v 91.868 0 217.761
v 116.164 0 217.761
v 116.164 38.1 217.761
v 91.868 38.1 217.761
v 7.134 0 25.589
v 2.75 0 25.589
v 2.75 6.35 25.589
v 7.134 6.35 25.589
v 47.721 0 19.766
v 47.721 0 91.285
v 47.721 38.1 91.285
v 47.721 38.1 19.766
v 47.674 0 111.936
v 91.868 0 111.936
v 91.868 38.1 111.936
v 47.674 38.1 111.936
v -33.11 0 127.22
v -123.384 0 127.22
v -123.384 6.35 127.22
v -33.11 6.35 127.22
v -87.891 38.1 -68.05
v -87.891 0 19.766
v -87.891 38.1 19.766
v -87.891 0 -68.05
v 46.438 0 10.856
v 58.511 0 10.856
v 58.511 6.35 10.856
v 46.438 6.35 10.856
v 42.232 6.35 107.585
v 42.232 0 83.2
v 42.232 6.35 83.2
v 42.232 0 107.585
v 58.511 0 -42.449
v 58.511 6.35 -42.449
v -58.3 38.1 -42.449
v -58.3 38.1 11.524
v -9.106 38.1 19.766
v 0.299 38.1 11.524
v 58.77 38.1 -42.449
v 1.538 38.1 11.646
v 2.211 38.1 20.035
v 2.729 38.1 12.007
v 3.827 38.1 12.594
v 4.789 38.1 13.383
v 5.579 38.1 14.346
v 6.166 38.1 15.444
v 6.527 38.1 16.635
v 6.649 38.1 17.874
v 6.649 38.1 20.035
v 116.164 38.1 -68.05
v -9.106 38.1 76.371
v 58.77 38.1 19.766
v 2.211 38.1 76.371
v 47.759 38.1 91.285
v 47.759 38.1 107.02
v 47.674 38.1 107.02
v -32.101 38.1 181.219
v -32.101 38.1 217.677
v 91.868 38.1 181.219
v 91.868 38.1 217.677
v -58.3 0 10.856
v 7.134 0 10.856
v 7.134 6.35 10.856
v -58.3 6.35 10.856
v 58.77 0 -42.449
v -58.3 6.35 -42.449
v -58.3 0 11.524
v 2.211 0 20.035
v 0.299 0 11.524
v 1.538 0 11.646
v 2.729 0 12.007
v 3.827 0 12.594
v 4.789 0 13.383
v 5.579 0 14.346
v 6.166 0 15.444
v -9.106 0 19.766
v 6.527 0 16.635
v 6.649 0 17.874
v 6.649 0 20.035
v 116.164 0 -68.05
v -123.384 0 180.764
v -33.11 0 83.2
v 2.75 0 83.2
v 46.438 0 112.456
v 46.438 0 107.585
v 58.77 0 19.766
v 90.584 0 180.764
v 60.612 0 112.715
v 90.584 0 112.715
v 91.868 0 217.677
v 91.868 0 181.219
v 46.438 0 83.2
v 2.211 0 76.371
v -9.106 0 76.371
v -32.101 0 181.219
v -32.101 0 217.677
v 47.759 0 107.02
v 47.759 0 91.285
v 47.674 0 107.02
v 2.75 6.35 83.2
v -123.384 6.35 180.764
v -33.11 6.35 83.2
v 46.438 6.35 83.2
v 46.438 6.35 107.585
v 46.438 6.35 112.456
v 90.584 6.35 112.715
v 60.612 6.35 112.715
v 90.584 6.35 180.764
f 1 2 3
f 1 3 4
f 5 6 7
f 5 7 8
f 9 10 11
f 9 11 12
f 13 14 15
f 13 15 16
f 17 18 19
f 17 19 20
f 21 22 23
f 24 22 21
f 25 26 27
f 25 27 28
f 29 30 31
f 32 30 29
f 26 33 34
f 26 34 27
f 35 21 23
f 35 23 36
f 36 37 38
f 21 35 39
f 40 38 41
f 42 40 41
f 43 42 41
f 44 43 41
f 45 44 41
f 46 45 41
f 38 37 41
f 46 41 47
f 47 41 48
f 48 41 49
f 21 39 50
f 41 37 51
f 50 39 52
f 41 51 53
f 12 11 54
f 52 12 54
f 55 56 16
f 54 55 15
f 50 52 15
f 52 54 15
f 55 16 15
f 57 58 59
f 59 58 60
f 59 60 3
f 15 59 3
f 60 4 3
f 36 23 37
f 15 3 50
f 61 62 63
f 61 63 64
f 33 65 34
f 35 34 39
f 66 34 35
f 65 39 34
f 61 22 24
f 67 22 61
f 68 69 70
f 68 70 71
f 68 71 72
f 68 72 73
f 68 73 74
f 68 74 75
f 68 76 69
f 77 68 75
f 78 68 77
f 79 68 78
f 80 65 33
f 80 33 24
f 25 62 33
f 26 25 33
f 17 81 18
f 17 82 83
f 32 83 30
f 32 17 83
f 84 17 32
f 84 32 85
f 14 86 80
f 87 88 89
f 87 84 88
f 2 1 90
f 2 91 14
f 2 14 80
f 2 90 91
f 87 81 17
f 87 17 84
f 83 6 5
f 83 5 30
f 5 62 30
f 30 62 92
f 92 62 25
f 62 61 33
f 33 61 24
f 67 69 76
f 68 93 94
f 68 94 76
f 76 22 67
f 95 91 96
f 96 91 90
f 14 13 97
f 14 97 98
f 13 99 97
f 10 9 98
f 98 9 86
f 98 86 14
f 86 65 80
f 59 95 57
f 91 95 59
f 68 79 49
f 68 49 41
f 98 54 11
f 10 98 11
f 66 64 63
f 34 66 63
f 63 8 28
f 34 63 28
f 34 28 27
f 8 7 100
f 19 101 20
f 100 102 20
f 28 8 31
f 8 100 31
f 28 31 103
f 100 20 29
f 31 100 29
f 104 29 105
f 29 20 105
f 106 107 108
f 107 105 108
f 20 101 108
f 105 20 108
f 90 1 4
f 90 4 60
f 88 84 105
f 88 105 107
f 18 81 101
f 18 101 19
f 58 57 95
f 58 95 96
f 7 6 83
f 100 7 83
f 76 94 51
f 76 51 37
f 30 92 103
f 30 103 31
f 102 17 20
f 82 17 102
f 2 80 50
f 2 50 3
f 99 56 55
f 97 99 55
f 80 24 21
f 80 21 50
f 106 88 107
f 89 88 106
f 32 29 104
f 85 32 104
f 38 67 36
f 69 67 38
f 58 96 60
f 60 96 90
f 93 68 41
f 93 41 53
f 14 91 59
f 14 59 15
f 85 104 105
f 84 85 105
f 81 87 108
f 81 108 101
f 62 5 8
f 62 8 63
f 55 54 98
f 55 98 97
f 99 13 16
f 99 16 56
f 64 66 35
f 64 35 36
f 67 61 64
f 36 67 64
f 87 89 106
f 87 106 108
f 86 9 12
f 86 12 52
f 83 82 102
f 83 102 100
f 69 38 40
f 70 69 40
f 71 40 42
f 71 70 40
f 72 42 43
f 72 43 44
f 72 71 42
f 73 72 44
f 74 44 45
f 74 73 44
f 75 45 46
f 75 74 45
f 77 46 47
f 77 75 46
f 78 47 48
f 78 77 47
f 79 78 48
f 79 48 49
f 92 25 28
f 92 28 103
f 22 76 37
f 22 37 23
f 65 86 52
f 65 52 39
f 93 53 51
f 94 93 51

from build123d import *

# Parameters (mm, degrees)
F1_W     = 123.9689588547
F1_H     = 36.4573895931
F1_W_2   = 0.162653625
F1_W_3   = 29.5906402171
F1_H_2   = 8.2422317937
F1_W_4   = 49.1941384971
F1_W_5   = 22.0608375967
F1_H_3   = 15.7345682383
F2_DEPTH = 38.1
F0_W     = 4.2057580379
F0_H     = 0.258524442
F0_H_2   = 4.8711853978
F0_W_2   = 4.3841055594
F0_H_3   = 57.6105192304
F3_DEPTH = 6.35


with BuildPart() as f2:
    # F1 (on Front) → F2 (new body)
    with BuildSketch(Plane.XZ):
        with Locations((29.8835039139, 199.447914958)):
            Rectangle(F1_W, F1_H)
        Polygon((-9.1060101986, 25.0596683472), (-9.1060101986, 20.0354661793), (2.2110529244, 20.0354661793), (2.2110529244, 76.3713121414), (-9.1060101986, 76.3713121414), align=None)
        Polygon((92.0306369662, 181.2192201614), (91.8679833412, 181.2192201614), (91.8679833412, 111.9364649057), (116.1640360951, 111.9364649057), (116.1640360951, 217.7610099316), (91.8679833412, 217.7610099316), (91.8679833412, 217.6766097546), (92.0306369662, 217.6766097546), align=None)
        with Locations((91.9493101537, 199.447914958)):
            Rectangle(F1_W_2, F1_H)
        Polygon((-87.8907889128, -68.0502578616), (-58.3001486957, -68.0502578616), (-58.3001486957, -42.4493700266), (-58.3001486957, 11.523572728), (-87.8907889128, 11.523572728), align=None)
        with Locations((-73.0954688042, 15.6446886249)):
            Rectangle(F1_W_3, F1_H_2)
        with BuildLine():
            Line((-9.1060101986, 19.7658045217), (-9.1060101986, 11.523572728))
            Line((-9.1060101986, 11.523572728), (0.2991169855, 11.523572728))
            ThreePointArc((0.2991169855, 11.523572728), (4.789245046, 13.3834446675), (6.6491169855, 17.873572728))
            Line((6.6491169855, 17.873572728), (6.6491169855, 20.0354661793))
            Line((6.6491169855, 20.0354661793), (2.2110529244, 20.0354661793))
            Line((2.2110529244, 20.0354661793), (-9.1060101986, 20.0354661793))
            Line((-9.1060101986, 20.0354661793), (-9.1060101986, 19.7658045217))
        make_face()
        with Locations((-33.7030794472, 15.6446886249)):
            Rectangle(F1_W_4, F1_H_2)
        with Locations((58.7894786149, 99.1525352001)):
            Rectangle(F1_W_5, F1_H_3)
        Polygon((69.8198974133, 91.285251081), (47.7590598166, 91.285251081), (47.7206557989, 91.285251081), (47.7206557989, 19.7658045217), (58.7702766061, 19.7658045217), (69.8198974133, 19.7658045217), align=None)
        Polygon((69.8198974133, -42.4493700266), (69.8198974133, 19.7658045217), (58.7702766061, 19.7658045217), (58.7702766061, 19.5491779596), (58.7702766061, -42.4493700266), align=None)
        Polygon((-58.3001486957, -68.0502578616), (69.8198974133, -68.0502578616), (69.8198974133, -42.4493700266), (58.7702766061, -42.4493700266), (-58.3001486957, -42.4493700266), align=None)
        Polygon((116.1640360951, 111.9364649057), (91.8679833412, 111.9364649057), (47.6743020117, 111.9364649057), (47.6743020117, 107.0198193192), (47.7590598166, 107.0198193192), (69.8198974133, 107.0198193192), (116.1640360951, 107.0198193192), align=None)
        Polygon((116.1640360951, -68.0502578616), (116.1640360951, 107.0198193192), (69.8198974133, 107.0198193192), (69.8198974133, 91.285251081), (69.8198974133, 19.7658045217), (69.8198974133, -42.4493700266), (69.8198974133, -68.0502578616), align=None)
    extrude(amount=-F2_DEPTH)

    # F0 (on Front) → F3 (join)
    with BuildSketch(Plane.XZ):
        Polygon((60.6123084808, 112.7149015665), (90.5843084808, 112.7149015665), (90.5843084808, 180.7640045881), (-33.110268414, 180.7640045881), (-33.110268414, 127.2203028202), (-33.110268414, 112.7149015665), (2.749980893, 112.7149015665), (42.2322228551, 112.7149015665), (46.437980893, 112.7149015665), align=None)
        Polygon((46.437980893, 112.4563771245), (60.6123084808, 112.7149015665), (46.437980893, 112.7149015665), align=None)
        Polygon((-33.110268414, 127.2203028202), (-33.110268414, 180.7640045881), (-123.3842537674, 180.7640045881), (-123.3842537674, 127.2203028202), (-118.7781766057, 127.2203028202), align=None)
        with Locations((44.335101874, 112.5856393455)):
            Rectangle(F0_W, F0_H)
        with Locations((44.335101874, 110.0207844256)):
            Rectangle(F0_W, F0_H_2)
        Polygon((42.2322228551, 107.5851917267), (42.2322228551, 112.4563771245), (7.1340864524, 112.4563771245), (7.1340864524, 83.1997692585), (42.2322228551, 83.1997692585), align=None)
        Polygon((7.1340864524, 112.4563771245), (42.2322228551, 112.4563771245), (42.2322228551, 112.7149015665), (2.749980893, 112.7149015665), (-33.110268414, 112.7149015665), (-33.110268414, 83.1997692585), (2.749980893, 83.1997692585), (7.1340864524, 83.1997692585), align=None)
        Polygon((46.437980893, 83.1997692585), (42.2322228551, 83.1997692585), (7.1340864524, 83.1997692585), (7.1340864524, 25.5892500281), (7.1340864524, 10.8563771245), (46.437980893, 10.8563771245), align=None)
        with Locations((4.9420336727, 54.3945096433)):
            Rectangle(F0_W_2, F0_H_3)
        Polygon((58.5113357362, 10.8563771245), (46.437980893, 10.8563771245), (7.1340864524, 10.8563771245), (2.749980893, 10.8563771245), (-58.3286642638, 10.8563771245), (-58.3286642638, -42.4836228755), (58.5113357362, -42.4836228755), align=None)
    extrude(amount=-F3_DEPTH)


solid = f2.part
